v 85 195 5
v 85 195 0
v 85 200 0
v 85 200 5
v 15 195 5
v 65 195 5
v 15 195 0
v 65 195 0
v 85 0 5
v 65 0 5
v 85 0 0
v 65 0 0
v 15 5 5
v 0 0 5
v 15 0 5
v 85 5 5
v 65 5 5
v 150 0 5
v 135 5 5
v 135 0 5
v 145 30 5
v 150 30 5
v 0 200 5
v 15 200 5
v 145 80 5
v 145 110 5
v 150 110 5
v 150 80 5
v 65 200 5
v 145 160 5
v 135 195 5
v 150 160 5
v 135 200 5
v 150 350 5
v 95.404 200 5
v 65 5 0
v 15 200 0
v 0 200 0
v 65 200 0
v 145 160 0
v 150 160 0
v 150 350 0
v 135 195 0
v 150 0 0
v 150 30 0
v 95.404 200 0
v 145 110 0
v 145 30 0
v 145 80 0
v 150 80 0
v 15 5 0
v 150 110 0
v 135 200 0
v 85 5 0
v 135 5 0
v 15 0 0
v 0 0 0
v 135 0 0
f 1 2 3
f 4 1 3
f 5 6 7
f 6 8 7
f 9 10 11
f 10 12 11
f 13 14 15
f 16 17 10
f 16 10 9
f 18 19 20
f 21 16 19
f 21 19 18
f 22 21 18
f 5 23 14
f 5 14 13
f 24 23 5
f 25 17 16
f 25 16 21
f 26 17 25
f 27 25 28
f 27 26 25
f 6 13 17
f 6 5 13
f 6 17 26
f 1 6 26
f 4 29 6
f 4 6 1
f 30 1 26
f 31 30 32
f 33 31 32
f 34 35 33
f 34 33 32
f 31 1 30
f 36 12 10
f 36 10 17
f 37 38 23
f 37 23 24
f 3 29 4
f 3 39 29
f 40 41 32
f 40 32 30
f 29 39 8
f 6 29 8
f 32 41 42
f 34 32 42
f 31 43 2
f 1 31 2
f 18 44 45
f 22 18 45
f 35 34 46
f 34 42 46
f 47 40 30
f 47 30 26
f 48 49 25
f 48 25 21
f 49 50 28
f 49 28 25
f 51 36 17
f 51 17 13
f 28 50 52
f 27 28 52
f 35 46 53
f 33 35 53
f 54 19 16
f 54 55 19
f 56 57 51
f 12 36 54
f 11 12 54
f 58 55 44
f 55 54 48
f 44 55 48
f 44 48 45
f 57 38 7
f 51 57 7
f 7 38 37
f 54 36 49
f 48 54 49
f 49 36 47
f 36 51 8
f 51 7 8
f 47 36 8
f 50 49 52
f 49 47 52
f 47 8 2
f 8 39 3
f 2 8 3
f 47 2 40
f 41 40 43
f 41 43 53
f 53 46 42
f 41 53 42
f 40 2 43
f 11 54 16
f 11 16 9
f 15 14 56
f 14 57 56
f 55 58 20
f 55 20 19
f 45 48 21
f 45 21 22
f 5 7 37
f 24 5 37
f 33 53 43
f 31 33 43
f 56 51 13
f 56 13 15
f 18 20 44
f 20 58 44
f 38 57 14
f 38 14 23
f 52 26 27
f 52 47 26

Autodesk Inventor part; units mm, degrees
ref_plane "YZ Plane" through (0, 0, 0) normal (1, 0, 0) x (0, 1, 0)
ref_plane "XZ Plane" through (0, 0, 0) normal (0, 1, 0) x (-1, 0, 0)
ref_plane "XY Plane" through (0, 0, 0) normal (0, 0, 1) x (1, 0, 0)
sketch "Sketch1" plane through (0, 0, 0) normal (0, 0, 1) x (1, 0, 0)
  line L0 (0, 0) -> (150, 0) projected
  line L1 (150, 0) -> (150, 350) projected
  line L2 (150, 350) -> (95.4045, 200) projected
  line L3 (0, 200) -> (95.4045, 200) projected
  line L4 (0, 0) -> (0, 200) projected
  line L5 (15, 0) -> (65, 0)
  line L6 (65, 0) -> (65, 5)
  line L7 (65, 5) -> (15, 5)
  line L8 (15, 5) -> (15, 0)
  line L9 (85, 0) -> (135, 0)
  line L10 (135, 0) -> (135, 5)
  line L11 (135, 5) -> (85, 5)
  line L12 (85, 5) -> (85, 0)
  line L13 (15, 200) -> (65, 200)
  line L14 (65, 200) -> (65, 195)
  line L15 (65, 195) -> (15, 195)
  line L16 (15, 195) -> (15, 200)
  line L17 (85, 200) -> (135, 200)
  line L18 (135, 200) -> (135, 195)
  line L19 (135, 195) -> (85, 195)
  line L20 (85, 195) -> (85, 200)
  point P0 (65, 200)
  point P1 (65, 0)
  point P2 (135, 0)
  dimension "d0" = 50
  dimension "d1" = 5
  dimension "d2" = 50
  dimension "d3" = 5
  dimension "d4" = 20
  dimension "d5" = 15
  dimension "d6" = 50
  dimension "d7" = 5
  dimension "d8" = 5
  dimension "d9" = 15
extrude "Extrusion1" add sketch "Sketch1" along normal blind 5 contours L4 L3 L16 L15 L14 L20 L19 L18 L17 L2 L1 L0 L10 L11 L12 L6 L7 L8
sketch "Sketch2" plane through (0, 0, 0) normal (0, 0, -1) x (-1, 0, 0)
  line L0 (-150, 0) -> (-150, 350) projected
  line L1 (-150, 160) -> (-145, 160)
  line L2 (-145, 160) -> (-145, 110)
  line L3 (-145, 110) -> (-150, 110)
  line L4 (-150, 110) -> (-150, 160)
  line L5 (-150, 80) -> (-145, 80)
  line L6 (-145, 80) -> (-145, 30)
  line L7 (-145, 30) -> (-150, 30)
  line L8 (-150, 30) -> (-150, 80)
  line L9 (-135, 0) -> (-150, 0) projected
  point P0 (0, 0)
  dimension "d12" = 5
  dimension "d13" = 50
  dimension "d14" = 5
  dimension "d15" = 50
  dimension "d16" = 30
  dimension "d17" = 30
extrude "Extrusion2" cut sketch "Sketch2" against normal blind 5
equation "\"d2\" = d0"
equation "\"d3\" = d1"
properties part number "Lateral"
